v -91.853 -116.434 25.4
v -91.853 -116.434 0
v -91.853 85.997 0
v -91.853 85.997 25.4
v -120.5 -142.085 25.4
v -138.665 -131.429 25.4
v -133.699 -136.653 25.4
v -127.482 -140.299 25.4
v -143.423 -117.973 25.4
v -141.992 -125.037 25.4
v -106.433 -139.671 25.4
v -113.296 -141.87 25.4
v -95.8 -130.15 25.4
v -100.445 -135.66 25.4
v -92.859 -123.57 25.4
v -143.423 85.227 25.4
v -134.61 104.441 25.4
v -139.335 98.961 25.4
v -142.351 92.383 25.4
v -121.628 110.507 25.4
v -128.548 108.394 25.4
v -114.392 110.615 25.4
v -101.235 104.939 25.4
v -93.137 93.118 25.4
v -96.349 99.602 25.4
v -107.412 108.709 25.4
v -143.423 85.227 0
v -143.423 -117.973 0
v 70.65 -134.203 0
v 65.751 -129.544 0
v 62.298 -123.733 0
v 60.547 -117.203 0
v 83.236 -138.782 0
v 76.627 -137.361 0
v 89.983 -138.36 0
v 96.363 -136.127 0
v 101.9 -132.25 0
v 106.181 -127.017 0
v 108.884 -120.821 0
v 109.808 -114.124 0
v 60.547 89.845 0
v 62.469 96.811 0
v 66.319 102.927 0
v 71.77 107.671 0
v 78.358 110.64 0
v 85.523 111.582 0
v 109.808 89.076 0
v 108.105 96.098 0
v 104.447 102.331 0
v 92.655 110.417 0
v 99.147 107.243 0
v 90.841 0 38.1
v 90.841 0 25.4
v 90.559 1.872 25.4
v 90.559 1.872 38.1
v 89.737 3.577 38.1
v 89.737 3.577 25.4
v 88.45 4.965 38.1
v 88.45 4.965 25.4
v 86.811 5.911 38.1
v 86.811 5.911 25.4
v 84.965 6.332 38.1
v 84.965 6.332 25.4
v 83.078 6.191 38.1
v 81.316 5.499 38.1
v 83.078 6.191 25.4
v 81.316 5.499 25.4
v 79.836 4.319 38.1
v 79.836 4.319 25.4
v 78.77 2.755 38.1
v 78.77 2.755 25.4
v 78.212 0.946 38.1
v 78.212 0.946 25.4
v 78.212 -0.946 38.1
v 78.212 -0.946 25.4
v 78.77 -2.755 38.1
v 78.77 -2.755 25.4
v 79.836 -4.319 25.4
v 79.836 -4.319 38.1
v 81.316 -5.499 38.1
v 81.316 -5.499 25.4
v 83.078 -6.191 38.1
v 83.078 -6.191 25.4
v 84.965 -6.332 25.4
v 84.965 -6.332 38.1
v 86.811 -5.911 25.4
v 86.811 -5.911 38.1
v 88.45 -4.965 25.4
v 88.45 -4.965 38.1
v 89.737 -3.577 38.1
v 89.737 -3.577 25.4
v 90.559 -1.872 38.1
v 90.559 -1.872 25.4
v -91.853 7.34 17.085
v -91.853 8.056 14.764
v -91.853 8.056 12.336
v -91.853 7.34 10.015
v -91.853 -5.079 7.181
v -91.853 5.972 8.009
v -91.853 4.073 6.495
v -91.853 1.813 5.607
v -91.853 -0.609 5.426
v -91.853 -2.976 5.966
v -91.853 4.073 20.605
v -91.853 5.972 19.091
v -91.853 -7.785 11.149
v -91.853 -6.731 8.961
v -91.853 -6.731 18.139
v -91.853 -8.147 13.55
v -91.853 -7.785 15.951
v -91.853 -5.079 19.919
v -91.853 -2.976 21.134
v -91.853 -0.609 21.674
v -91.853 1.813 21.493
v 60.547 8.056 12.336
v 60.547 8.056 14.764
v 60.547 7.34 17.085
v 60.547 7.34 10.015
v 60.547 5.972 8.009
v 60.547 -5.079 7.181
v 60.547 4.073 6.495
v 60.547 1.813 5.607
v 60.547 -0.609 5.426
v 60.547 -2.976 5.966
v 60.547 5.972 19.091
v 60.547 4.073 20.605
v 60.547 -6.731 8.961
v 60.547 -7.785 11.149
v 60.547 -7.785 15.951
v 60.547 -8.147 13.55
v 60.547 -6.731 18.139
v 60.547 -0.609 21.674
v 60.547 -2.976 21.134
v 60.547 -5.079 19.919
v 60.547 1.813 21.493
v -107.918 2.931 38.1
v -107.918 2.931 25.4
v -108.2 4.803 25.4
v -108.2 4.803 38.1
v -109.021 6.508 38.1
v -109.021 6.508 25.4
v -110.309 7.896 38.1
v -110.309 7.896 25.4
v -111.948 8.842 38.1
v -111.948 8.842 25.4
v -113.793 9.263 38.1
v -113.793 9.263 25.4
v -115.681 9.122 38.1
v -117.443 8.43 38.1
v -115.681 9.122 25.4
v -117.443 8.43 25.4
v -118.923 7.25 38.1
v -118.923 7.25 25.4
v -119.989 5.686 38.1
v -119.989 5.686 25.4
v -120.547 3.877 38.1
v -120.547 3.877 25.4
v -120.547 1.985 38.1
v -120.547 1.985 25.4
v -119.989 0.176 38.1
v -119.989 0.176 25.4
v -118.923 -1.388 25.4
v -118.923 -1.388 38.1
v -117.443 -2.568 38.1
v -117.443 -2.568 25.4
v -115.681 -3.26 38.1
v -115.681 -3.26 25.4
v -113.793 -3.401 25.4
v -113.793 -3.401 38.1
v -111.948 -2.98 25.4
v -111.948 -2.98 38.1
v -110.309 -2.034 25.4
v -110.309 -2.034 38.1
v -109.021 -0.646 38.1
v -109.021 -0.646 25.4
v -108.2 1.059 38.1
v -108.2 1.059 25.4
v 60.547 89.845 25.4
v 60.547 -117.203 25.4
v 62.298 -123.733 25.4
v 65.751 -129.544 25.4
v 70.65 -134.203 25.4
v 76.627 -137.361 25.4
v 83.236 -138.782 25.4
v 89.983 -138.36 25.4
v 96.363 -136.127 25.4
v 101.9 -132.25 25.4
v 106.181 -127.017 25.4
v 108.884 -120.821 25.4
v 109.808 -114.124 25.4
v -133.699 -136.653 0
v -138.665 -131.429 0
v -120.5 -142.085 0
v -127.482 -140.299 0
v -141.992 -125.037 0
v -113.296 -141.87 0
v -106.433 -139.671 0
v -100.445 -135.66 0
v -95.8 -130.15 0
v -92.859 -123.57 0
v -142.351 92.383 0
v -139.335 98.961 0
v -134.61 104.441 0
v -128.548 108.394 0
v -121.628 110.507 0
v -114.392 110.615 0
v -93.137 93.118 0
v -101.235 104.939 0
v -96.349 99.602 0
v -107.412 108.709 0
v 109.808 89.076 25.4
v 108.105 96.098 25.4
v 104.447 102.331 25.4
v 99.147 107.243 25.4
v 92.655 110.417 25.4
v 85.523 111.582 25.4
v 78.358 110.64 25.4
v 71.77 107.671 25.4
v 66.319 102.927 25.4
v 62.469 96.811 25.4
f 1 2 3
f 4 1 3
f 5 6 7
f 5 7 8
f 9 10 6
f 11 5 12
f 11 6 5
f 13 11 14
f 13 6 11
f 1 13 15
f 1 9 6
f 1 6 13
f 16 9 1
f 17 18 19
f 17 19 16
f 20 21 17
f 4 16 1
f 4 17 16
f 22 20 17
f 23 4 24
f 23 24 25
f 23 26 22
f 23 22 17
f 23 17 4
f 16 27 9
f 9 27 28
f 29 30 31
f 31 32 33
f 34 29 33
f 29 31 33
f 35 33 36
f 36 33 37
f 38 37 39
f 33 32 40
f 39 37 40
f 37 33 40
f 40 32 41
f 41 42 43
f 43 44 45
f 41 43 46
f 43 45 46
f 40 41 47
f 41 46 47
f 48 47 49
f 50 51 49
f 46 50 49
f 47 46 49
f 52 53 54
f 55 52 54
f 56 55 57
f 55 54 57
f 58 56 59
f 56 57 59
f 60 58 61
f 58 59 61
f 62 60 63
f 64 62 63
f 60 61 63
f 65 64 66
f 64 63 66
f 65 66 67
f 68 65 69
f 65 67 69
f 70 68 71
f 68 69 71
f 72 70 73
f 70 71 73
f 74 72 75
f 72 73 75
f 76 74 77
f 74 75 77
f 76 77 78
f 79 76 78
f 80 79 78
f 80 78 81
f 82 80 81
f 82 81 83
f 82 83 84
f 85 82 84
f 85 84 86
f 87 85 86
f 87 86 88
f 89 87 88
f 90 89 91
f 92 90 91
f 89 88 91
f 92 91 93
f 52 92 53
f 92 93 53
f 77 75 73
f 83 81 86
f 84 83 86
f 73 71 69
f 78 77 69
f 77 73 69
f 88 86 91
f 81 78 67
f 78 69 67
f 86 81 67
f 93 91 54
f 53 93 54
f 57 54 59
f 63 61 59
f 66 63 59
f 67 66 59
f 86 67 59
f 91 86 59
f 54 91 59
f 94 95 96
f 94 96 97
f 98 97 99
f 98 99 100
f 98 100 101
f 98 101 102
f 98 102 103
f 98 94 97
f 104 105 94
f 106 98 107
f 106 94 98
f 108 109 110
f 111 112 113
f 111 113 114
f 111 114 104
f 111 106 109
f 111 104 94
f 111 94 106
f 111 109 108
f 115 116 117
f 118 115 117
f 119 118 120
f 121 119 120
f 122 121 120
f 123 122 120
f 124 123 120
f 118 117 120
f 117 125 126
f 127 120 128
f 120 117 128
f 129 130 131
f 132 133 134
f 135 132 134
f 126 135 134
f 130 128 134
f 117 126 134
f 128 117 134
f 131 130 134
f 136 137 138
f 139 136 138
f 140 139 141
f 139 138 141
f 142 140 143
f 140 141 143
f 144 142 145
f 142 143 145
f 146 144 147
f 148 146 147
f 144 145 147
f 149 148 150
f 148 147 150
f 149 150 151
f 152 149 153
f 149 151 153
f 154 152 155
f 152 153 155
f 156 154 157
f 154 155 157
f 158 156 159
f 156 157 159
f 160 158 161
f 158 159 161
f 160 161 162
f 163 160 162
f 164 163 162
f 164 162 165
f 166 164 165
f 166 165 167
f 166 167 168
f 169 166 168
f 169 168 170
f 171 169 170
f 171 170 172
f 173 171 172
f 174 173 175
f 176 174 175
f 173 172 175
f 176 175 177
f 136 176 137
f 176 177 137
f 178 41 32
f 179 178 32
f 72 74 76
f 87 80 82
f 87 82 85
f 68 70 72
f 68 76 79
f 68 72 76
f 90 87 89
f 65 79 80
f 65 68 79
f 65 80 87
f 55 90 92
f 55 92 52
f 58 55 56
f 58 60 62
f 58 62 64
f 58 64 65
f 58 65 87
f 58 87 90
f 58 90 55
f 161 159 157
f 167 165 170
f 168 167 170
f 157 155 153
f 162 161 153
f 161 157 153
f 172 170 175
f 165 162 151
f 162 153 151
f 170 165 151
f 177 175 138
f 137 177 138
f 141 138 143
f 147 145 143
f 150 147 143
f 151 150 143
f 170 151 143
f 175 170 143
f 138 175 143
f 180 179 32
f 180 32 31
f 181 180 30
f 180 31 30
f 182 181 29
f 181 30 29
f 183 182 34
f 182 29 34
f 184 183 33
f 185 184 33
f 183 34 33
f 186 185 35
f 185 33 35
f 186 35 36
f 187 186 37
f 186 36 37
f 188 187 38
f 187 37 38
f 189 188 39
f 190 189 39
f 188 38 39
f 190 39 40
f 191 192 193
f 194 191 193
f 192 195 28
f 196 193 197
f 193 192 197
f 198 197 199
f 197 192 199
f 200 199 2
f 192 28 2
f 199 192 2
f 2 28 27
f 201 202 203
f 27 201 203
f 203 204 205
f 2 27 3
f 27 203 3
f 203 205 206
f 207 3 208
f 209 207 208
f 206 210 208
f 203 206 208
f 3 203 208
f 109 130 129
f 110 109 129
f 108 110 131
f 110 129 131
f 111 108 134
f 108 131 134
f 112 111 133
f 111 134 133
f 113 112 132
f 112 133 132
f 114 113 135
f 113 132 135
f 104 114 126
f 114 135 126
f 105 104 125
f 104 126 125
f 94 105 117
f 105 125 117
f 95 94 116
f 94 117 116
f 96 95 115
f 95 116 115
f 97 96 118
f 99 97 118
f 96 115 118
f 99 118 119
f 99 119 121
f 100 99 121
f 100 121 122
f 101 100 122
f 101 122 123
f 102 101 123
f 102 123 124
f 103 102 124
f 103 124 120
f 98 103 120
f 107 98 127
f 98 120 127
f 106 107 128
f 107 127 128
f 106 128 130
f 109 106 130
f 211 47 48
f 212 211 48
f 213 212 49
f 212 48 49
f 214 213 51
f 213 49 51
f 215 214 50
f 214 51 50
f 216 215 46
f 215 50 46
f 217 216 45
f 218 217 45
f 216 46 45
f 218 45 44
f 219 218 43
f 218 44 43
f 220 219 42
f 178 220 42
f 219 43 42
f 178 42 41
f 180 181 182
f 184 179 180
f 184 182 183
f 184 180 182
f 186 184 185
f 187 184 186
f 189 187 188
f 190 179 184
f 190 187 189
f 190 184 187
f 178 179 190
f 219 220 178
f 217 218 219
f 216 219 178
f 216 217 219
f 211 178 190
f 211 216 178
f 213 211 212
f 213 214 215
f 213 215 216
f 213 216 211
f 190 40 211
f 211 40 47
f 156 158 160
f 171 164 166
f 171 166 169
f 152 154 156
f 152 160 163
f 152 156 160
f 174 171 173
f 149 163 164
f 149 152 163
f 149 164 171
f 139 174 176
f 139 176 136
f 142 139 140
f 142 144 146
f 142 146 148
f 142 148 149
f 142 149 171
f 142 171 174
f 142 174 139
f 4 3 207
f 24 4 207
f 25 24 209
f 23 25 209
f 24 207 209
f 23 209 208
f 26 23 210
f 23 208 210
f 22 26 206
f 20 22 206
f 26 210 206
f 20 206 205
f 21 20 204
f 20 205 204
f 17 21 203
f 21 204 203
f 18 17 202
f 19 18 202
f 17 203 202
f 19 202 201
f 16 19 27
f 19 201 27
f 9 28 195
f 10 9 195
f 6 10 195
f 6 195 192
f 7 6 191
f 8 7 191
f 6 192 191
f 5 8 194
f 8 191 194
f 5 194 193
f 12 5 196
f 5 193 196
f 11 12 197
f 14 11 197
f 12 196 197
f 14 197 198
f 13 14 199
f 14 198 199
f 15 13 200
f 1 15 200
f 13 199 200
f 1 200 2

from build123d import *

# Parameters (mm, degrees)
F1_DEPTH = 25.4
F2_R     = 8.146818
F3_DEPTH = 152.4
F4_R     = 6.35
F5_DEPTH = 12.7


with BuildPart() as f1:
    # F0 (on Top) → F1 (new body)
    with BuildSketch(Plane.XY):
        with BuildLine():
            Line((-91.852801, -116.4336), (-91.852801, 85.996719))
            ThreePointArc((-91.852801, 85.996719), (-118.013836, 110.816054), (-143.422504, 85.227018))
            Line((-143.422504, 85.227018), (-143.422504, -117.972982))
            ThreePointArc((-143.422504, -117.972982), (-116.890594, -142.229937), (-91.852801, -116.4336))
        make_face()
        with BuildLine():
            Line((109.807817, -114.124497), (109.807817, 89.075503))
            ThreePointArc((109.807817, 89.075503), (85.523167, 111.582436), (60.547199, 89.845204))
            Line((60.547199, 89.845204), (60.547199, -117.203301))
            ThreePointArc((60.547199, -117.203301), (86.623701, -138.802865), (109.807817, -114.124497))
        make_face()
    extrude(amount=F1_DEPTH)


with BuildPart() as f3:
    # F2 (on face) → F3 (new body)
    with BuildSketch(Plane(origin=(60.547199, 0, 0), x_dir=(0, -1, 0), z_dir=(-1, 0, 0))):
        with Locations((0, 13.550039)):
            Circle(F2_R)
    extrude(amount=F3_DEPTH)


with BuildPart() as f5:
    # F4 (on face) → F5 (new body)
    with BuildSketch(Plane.XY.offset(25.4)):
        with Locations((-114.26793, 2.931065)):
            Circle(F4_R)
        with Locations((84.490866, 0)):
            Circle(F4_R)
    extrude(amount=F5_DEPTH)


solid = Compound([f1.part, f3.part, f5.part])
